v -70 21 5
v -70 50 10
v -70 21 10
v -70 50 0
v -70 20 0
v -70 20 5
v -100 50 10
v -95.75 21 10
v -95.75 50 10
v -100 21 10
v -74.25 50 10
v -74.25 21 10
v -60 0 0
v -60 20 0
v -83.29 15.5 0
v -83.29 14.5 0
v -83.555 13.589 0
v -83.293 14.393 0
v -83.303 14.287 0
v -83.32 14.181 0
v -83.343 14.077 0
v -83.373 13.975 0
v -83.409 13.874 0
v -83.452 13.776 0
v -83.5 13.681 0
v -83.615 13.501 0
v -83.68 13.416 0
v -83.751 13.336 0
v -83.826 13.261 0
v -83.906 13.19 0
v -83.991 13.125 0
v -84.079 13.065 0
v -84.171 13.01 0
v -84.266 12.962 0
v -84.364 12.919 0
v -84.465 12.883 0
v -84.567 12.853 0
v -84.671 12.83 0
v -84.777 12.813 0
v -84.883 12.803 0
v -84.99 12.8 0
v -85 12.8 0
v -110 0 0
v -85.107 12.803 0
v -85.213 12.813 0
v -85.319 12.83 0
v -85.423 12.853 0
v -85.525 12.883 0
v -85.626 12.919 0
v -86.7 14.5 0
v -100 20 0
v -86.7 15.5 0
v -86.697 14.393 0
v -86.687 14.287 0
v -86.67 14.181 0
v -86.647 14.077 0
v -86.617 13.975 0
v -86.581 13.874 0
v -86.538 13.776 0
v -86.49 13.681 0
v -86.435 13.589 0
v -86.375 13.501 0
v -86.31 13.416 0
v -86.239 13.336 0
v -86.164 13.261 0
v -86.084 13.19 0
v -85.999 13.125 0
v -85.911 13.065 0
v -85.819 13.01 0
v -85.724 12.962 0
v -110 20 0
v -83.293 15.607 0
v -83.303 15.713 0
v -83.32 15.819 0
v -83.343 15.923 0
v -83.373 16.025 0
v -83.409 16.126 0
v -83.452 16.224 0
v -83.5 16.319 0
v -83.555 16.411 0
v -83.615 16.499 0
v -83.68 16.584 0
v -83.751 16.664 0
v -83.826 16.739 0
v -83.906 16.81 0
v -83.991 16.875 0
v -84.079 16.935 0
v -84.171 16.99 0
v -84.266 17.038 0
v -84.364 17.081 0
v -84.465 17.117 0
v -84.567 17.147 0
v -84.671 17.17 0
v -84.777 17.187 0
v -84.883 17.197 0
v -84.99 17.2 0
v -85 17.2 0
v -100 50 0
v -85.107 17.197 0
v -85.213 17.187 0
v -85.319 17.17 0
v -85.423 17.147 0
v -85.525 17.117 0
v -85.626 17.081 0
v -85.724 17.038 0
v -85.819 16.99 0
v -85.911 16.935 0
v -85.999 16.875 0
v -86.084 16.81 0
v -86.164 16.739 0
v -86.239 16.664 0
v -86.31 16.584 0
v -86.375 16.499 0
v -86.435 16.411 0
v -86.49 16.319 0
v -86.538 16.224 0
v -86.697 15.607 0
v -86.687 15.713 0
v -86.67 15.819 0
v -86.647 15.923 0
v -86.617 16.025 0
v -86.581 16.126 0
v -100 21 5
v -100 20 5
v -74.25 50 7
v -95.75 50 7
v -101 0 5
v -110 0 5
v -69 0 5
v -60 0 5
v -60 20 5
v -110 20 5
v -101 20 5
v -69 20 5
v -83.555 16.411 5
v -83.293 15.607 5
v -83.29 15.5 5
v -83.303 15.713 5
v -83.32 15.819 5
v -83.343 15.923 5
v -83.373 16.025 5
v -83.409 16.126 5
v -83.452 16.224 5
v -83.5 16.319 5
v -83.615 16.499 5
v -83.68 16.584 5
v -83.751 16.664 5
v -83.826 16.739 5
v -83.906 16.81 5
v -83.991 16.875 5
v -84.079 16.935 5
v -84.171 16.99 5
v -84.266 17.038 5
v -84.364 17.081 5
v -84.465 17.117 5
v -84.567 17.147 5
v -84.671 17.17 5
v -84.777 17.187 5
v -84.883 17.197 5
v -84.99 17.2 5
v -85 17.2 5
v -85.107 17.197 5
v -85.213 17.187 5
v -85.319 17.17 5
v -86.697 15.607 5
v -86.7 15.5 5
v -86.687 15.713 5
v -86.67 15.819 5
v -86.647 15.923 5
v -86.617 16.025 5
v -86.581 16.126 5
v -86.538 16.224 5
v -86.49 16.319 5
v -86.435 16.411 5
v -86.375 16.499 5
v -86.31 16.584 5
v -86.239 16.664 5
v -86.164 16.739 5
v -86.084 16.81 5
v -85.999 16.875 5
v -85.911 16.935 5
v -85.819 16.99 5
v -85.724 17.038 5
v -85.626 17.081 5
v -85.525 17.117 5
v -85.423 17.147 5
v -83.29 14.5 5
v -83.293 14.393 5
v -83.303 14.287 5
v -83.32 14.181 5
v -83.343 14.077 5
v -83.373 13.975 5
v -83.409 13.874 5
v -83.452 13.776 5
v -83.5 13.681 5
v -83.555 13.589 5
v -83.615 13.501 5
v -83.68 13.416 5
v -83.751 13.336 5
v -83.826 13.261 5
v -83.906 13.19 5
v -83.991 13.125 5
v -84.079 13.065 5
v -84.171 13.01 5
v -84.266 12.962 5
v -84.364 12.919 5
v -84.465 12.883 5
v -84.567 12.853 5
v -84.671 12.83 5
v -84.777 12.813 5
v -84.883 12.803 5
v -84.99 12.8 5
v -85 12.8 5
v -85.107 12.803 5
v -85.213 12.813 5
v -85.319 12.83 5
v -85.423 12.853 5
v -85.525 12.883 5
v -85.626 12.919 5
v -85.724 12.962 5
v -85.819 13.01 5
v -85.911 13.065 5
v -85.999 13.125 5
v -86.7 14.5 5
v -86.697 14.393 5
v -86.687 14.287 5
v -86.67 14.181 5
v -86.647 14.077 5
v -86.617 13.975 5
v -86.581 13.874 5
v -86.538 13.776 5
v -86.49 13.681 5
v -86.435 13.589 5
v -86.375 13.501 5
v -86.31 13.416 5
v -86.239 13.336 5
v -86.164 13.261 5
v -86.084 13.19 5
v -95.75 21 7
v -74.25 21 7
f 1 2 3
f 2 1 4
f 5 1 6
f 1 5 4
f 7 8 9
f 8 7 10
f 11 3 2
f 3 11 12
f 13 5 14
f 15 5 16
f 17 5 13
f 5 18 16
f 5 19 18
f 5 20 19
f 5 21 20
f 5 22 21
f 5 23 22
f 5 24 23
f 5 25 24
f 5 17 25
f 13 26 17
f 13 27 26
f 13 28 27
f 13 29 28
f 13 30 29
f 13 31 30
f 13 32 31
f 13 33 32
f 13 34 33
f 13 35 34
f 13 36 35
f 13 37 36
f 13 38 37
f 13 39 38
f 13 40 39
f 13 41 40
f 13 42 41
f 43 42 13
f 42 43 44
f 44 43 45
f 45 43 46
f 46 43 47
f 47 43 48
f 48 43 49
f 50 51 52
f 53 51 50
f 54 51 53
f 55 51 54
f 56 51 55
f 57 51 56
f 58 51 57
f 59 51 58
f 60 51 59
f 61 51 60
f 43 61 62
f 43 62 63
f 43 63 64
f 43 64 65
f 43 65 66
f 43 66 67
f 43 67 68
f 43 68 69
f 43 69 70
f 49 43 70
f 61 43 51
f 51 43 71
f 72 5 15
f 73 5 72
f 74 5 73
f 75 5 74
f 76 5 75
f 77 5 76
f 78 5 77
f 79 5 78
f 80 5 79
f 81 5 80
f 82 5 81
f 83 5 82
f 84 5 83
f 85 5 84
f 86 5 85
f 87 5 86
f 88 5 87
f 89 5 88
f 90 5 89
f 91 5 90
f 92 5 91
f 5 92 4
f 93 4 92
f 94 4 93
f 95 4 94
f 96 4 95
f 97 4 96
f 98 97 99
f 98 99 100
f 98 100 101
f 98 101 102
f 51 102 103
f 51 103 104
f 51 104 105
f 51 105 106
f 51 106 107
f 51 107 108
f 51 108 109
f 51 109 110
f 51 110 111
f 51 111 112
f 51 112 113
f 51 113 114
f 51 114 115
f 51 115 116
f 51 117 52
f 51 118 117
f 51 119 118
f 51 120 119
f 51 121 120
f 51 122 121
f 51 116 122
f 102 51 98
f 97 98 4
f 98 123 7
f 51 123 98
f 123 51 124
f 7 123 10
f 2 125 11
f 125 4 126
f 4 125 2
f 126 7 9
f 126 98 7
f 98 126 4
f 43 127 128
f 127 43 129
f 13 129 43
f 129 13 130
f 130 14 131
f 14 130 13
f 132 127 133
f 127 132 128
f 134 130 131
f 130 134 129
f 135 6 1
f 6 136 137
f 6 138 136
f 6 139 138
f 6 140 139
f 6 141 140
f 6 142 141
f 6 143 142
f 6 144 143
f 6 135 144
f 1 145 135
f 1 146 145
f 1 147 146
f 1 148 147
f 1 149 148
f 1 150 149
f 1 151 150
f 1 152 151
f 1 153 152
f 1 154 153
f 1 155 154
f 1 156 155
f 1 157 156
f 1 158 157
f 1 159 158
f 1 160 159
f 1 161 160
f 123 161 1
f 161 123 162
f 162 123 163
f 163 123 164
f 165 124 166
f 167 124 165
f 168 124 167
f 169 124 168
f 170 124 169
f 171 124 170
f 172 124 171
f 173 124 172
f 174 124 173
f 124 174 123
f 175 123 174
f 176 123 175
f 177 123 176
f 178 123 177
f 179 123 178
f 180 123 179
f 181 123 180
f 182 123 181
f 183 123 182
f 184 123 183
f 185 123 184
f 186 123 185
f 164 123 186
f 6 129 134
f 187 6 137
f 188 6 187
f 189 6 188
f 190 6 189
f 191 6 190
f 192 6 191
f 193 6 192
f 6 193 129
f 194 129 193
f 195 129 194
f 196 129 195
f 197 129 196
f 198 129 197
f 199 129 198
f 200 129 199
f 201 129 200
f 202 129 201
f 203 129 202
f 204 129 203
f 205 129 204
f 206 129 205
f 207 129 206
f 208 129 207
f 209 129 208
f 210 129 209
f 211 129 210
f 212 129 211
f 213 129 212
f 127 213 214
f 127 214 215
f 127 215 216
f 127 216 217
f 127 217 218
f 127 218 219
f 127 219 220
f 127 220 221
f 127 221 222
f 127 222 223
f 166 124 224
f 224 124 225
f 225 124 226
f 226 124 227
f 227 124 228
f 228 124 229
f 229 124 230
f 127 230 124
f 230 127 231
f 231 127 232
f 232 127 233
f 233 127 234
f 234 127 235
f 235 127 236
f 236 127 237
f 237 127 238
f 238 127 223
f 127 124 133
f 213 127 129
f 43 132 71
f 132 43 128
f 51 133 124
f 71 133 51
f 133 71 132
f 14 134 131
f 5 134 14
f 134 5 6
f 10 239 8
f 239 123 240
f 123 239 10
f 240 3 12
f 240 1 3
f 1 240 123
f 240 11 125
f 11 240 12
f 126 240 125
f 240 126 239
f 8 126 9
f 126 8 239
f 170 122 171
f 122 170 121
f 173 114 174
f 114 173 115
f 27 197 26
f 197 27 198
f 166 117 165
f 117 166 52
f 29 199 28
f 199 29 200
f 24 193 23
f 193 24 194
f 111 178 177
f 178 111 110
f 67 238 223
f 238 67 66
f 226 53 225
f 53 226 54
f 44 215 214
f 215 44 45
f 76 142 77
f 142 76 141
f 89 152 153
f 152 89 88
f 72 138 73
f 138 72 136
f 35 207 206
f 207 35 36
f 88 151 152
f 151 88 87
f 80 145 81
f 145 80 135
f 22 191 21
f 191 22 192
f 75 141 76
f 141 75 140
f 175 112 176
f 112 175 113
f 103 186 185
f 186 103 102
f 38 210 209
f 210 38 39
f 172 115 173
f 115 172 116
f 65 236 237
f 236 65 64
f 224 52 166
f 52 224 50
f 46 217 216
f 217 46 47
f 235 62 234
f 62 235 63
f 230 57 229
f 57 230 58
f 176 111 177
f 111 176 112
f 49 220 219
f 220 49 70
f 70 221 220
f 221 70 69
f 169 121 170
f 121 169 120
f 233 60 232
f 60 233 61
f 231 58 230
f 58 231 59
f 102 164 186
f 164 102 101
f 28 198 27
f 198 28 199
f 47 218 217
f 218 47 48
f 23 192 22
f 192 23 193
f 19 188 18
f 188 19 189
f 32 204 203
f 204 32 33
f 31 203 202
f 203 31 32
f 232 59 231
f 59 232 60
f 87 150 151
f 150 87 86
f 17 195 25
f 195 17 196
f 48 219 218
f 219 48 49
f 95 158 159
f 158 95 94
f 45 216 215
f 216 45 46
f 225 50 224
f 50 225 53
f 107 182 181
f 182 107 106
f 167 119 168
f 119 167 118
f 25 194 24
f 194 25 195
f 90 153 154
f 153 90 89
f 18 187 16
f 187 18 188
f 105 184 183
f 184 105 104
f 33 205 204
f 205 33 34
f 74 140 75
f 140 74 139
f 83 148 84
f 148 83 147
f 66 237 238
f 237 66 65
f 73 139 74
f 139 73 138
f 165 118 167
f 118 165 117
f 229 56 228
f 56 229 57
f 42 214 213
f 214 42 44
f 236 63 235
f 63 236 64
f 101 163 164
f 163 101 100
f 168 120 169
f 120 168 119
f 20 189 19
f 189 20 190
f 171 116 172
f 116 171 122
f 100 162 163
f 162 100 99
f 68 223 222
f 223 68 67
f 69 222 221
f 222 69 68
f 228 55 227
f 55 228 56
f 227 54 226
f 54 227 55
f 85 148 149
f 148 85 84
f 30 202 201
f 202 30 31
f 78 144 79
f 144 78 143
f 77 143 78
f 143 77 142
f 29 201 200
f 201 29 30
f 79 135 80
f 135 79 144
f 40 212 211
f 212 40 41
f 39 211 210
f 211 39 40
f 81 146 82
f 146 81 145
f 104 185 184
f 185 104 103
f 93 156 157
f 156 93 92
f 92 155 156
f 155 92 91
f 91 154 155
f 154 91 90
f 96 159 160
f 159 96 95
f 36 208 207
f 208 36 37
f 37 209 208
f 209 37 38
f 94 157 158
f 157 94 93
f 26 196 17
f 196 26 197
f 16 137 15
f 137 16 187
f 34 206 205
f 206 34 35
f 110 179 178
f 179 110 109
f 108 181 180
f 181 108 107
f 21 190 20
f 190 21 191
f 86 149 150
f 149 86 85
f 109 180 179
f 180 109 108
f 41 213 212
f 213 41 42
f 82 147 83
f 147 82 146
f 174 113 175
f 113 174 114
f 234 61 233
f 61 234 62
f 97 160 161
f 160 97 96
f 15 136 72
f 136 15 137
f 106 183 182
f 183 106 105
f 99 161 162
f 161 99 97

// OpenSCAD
$fn = 100;

module kast1() {
    
    difference() {
    union() {
        cube([30, 50, 10]);
        
        translate([-10, 0, 0])
            cube([50, 20, 5]);
        }
    
    translate([-1, -1, 5])
        cube([32, 22, 8]);    
    
    translate([4.25, -1, 7])
        cube([21.5, 52, 8]);   
   
    minkowski() {
        cube([0.01, 1, 0.01]);
        
        translate([15, 14.5, -1])
            cylinder(10, 1.7, 1.7);
        }
    }    
}

module kast2() {
    difference() {
        cube([40, 40, 5]);

        translate([-1, 0, 0])
        rotate([30, 0, 0])
          cube([50, 40, 5]);

        minkowski() {
            cube([40, 0.01, 0.01]);
            
          translate([0, 20, 11])
              sphere(10);
          }
        }    
        
    }


module kast3() {
    
    difference() {
        union() {
            translate([-11, -20])
                cube([22, 40, 1]); 

            translate([0, 0, -3])
                sphere(8);
            }
            
        translate([-12, -20, -50])
            cube([24, 40, 50]); 

        translate([-12, 20, -1])
            rotate([60, 0, 0])
                cube([24, 10, 10]); 


        translate([-12, -20, -1])
            rotate([-309, 0, 0])
                cube([24, 10, 10]); 
           
    }
}


translate([-100, 0, 0])
    kast1();

//translate([0, 0, 0])
//    kast2();

//translate([100, 0, 0])
//    kast3();
